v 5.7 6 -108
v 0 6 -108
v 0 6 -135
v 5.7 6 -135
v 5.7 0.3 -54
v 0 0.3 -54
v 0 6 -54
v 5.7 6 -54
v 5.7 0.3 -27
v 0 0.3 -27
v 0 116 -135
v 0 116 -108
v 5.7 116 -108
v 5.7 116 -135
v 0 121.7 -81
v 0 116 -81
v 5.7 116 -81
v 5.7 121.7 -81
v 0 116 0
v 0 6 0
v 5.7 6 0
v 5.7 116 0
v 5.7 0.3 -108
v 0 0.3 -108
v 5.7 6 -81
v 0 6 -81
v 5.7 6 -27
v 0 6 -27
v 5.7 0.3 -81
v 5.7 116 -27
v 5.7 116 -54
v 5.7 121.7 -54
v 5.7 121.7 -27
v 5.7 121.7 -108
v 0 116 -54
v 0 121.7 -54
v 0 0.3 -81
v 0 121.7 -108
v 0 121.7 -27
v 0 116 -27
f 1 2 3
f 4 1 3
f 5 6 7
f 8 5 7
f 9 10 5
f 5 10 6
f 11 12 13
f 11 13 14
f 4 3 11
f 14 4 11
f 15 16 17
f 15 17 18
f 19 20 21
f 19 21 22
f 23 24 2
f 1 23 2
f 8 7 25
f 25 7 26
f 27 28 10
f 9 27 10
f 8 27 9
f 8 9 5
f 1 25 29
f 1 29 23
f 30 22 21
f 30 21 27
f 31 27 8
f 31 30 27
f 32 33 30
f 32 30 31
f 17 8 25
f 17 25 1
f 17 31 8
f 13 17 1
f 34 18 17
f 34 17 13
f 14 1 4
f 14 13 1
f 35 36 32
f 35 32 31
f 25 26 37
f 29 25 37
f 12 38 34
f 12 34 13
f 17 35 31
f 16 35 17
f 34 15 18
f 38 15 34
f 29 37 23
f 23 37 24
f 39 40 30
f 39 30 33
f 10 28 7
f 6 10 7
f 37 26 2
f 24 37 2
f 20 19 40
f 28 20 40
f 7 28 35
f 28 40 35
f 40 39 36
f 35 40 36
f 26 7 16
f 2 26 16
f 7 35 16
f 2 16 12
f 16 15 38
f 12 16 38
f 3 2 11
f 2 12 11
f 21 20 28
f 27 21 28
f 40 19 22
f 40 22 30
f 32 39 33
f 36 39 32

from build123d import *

# Parameters (mm, degrees)
SKETCH1_W           = 135
SKETCH1_H           = 122
BOSS_EXTRUDE1_DEPTH = 5.7
CUT_EXTRUDE1_DEPTH  = 57


with BuildPart() as part:
    # Sketch1 → Boss-Extrude1 (new body)
    with BuildSketch(Plane(origin=(0, 0, 0), x_dir=(0, 0, -1), z_dir=(1, 0, 0))):
        with Locations((67.5, 61)):
            Rectangle(SKETCH1_W, SKETCH1_H)
    extrude(amount=BOSS_EXTRUDE1_DEPTH)

    # Sketch2 → Cut-Extrude1 (cut)
    with BuildSketch(Plane(origin=(0, 0, 0), x_dir=(0, 0, -1), z_dir=(1, 0, 0))):
        Polygon((0, 116), (27, 116), (27, 121.7), (54, 121.7), (54, 116), (81, 116), (81, 121.7), (108, 121.7), (108, 116), (135, 116), (135, 130), (0, 130), align=None)
        Polygon((0, -8), (0, 6), (27, 6), (27, 0.3), (54, 0.3), (54, 6), (81, 6), (81, 0.3), (108, 0.3), (108, 6), (135, 6), (135, -8), align=None)
    extrude(amount=CUT_EXTRUDE1_DEPTH, mode=Mode.SUBTRACT)


solid = part.part
